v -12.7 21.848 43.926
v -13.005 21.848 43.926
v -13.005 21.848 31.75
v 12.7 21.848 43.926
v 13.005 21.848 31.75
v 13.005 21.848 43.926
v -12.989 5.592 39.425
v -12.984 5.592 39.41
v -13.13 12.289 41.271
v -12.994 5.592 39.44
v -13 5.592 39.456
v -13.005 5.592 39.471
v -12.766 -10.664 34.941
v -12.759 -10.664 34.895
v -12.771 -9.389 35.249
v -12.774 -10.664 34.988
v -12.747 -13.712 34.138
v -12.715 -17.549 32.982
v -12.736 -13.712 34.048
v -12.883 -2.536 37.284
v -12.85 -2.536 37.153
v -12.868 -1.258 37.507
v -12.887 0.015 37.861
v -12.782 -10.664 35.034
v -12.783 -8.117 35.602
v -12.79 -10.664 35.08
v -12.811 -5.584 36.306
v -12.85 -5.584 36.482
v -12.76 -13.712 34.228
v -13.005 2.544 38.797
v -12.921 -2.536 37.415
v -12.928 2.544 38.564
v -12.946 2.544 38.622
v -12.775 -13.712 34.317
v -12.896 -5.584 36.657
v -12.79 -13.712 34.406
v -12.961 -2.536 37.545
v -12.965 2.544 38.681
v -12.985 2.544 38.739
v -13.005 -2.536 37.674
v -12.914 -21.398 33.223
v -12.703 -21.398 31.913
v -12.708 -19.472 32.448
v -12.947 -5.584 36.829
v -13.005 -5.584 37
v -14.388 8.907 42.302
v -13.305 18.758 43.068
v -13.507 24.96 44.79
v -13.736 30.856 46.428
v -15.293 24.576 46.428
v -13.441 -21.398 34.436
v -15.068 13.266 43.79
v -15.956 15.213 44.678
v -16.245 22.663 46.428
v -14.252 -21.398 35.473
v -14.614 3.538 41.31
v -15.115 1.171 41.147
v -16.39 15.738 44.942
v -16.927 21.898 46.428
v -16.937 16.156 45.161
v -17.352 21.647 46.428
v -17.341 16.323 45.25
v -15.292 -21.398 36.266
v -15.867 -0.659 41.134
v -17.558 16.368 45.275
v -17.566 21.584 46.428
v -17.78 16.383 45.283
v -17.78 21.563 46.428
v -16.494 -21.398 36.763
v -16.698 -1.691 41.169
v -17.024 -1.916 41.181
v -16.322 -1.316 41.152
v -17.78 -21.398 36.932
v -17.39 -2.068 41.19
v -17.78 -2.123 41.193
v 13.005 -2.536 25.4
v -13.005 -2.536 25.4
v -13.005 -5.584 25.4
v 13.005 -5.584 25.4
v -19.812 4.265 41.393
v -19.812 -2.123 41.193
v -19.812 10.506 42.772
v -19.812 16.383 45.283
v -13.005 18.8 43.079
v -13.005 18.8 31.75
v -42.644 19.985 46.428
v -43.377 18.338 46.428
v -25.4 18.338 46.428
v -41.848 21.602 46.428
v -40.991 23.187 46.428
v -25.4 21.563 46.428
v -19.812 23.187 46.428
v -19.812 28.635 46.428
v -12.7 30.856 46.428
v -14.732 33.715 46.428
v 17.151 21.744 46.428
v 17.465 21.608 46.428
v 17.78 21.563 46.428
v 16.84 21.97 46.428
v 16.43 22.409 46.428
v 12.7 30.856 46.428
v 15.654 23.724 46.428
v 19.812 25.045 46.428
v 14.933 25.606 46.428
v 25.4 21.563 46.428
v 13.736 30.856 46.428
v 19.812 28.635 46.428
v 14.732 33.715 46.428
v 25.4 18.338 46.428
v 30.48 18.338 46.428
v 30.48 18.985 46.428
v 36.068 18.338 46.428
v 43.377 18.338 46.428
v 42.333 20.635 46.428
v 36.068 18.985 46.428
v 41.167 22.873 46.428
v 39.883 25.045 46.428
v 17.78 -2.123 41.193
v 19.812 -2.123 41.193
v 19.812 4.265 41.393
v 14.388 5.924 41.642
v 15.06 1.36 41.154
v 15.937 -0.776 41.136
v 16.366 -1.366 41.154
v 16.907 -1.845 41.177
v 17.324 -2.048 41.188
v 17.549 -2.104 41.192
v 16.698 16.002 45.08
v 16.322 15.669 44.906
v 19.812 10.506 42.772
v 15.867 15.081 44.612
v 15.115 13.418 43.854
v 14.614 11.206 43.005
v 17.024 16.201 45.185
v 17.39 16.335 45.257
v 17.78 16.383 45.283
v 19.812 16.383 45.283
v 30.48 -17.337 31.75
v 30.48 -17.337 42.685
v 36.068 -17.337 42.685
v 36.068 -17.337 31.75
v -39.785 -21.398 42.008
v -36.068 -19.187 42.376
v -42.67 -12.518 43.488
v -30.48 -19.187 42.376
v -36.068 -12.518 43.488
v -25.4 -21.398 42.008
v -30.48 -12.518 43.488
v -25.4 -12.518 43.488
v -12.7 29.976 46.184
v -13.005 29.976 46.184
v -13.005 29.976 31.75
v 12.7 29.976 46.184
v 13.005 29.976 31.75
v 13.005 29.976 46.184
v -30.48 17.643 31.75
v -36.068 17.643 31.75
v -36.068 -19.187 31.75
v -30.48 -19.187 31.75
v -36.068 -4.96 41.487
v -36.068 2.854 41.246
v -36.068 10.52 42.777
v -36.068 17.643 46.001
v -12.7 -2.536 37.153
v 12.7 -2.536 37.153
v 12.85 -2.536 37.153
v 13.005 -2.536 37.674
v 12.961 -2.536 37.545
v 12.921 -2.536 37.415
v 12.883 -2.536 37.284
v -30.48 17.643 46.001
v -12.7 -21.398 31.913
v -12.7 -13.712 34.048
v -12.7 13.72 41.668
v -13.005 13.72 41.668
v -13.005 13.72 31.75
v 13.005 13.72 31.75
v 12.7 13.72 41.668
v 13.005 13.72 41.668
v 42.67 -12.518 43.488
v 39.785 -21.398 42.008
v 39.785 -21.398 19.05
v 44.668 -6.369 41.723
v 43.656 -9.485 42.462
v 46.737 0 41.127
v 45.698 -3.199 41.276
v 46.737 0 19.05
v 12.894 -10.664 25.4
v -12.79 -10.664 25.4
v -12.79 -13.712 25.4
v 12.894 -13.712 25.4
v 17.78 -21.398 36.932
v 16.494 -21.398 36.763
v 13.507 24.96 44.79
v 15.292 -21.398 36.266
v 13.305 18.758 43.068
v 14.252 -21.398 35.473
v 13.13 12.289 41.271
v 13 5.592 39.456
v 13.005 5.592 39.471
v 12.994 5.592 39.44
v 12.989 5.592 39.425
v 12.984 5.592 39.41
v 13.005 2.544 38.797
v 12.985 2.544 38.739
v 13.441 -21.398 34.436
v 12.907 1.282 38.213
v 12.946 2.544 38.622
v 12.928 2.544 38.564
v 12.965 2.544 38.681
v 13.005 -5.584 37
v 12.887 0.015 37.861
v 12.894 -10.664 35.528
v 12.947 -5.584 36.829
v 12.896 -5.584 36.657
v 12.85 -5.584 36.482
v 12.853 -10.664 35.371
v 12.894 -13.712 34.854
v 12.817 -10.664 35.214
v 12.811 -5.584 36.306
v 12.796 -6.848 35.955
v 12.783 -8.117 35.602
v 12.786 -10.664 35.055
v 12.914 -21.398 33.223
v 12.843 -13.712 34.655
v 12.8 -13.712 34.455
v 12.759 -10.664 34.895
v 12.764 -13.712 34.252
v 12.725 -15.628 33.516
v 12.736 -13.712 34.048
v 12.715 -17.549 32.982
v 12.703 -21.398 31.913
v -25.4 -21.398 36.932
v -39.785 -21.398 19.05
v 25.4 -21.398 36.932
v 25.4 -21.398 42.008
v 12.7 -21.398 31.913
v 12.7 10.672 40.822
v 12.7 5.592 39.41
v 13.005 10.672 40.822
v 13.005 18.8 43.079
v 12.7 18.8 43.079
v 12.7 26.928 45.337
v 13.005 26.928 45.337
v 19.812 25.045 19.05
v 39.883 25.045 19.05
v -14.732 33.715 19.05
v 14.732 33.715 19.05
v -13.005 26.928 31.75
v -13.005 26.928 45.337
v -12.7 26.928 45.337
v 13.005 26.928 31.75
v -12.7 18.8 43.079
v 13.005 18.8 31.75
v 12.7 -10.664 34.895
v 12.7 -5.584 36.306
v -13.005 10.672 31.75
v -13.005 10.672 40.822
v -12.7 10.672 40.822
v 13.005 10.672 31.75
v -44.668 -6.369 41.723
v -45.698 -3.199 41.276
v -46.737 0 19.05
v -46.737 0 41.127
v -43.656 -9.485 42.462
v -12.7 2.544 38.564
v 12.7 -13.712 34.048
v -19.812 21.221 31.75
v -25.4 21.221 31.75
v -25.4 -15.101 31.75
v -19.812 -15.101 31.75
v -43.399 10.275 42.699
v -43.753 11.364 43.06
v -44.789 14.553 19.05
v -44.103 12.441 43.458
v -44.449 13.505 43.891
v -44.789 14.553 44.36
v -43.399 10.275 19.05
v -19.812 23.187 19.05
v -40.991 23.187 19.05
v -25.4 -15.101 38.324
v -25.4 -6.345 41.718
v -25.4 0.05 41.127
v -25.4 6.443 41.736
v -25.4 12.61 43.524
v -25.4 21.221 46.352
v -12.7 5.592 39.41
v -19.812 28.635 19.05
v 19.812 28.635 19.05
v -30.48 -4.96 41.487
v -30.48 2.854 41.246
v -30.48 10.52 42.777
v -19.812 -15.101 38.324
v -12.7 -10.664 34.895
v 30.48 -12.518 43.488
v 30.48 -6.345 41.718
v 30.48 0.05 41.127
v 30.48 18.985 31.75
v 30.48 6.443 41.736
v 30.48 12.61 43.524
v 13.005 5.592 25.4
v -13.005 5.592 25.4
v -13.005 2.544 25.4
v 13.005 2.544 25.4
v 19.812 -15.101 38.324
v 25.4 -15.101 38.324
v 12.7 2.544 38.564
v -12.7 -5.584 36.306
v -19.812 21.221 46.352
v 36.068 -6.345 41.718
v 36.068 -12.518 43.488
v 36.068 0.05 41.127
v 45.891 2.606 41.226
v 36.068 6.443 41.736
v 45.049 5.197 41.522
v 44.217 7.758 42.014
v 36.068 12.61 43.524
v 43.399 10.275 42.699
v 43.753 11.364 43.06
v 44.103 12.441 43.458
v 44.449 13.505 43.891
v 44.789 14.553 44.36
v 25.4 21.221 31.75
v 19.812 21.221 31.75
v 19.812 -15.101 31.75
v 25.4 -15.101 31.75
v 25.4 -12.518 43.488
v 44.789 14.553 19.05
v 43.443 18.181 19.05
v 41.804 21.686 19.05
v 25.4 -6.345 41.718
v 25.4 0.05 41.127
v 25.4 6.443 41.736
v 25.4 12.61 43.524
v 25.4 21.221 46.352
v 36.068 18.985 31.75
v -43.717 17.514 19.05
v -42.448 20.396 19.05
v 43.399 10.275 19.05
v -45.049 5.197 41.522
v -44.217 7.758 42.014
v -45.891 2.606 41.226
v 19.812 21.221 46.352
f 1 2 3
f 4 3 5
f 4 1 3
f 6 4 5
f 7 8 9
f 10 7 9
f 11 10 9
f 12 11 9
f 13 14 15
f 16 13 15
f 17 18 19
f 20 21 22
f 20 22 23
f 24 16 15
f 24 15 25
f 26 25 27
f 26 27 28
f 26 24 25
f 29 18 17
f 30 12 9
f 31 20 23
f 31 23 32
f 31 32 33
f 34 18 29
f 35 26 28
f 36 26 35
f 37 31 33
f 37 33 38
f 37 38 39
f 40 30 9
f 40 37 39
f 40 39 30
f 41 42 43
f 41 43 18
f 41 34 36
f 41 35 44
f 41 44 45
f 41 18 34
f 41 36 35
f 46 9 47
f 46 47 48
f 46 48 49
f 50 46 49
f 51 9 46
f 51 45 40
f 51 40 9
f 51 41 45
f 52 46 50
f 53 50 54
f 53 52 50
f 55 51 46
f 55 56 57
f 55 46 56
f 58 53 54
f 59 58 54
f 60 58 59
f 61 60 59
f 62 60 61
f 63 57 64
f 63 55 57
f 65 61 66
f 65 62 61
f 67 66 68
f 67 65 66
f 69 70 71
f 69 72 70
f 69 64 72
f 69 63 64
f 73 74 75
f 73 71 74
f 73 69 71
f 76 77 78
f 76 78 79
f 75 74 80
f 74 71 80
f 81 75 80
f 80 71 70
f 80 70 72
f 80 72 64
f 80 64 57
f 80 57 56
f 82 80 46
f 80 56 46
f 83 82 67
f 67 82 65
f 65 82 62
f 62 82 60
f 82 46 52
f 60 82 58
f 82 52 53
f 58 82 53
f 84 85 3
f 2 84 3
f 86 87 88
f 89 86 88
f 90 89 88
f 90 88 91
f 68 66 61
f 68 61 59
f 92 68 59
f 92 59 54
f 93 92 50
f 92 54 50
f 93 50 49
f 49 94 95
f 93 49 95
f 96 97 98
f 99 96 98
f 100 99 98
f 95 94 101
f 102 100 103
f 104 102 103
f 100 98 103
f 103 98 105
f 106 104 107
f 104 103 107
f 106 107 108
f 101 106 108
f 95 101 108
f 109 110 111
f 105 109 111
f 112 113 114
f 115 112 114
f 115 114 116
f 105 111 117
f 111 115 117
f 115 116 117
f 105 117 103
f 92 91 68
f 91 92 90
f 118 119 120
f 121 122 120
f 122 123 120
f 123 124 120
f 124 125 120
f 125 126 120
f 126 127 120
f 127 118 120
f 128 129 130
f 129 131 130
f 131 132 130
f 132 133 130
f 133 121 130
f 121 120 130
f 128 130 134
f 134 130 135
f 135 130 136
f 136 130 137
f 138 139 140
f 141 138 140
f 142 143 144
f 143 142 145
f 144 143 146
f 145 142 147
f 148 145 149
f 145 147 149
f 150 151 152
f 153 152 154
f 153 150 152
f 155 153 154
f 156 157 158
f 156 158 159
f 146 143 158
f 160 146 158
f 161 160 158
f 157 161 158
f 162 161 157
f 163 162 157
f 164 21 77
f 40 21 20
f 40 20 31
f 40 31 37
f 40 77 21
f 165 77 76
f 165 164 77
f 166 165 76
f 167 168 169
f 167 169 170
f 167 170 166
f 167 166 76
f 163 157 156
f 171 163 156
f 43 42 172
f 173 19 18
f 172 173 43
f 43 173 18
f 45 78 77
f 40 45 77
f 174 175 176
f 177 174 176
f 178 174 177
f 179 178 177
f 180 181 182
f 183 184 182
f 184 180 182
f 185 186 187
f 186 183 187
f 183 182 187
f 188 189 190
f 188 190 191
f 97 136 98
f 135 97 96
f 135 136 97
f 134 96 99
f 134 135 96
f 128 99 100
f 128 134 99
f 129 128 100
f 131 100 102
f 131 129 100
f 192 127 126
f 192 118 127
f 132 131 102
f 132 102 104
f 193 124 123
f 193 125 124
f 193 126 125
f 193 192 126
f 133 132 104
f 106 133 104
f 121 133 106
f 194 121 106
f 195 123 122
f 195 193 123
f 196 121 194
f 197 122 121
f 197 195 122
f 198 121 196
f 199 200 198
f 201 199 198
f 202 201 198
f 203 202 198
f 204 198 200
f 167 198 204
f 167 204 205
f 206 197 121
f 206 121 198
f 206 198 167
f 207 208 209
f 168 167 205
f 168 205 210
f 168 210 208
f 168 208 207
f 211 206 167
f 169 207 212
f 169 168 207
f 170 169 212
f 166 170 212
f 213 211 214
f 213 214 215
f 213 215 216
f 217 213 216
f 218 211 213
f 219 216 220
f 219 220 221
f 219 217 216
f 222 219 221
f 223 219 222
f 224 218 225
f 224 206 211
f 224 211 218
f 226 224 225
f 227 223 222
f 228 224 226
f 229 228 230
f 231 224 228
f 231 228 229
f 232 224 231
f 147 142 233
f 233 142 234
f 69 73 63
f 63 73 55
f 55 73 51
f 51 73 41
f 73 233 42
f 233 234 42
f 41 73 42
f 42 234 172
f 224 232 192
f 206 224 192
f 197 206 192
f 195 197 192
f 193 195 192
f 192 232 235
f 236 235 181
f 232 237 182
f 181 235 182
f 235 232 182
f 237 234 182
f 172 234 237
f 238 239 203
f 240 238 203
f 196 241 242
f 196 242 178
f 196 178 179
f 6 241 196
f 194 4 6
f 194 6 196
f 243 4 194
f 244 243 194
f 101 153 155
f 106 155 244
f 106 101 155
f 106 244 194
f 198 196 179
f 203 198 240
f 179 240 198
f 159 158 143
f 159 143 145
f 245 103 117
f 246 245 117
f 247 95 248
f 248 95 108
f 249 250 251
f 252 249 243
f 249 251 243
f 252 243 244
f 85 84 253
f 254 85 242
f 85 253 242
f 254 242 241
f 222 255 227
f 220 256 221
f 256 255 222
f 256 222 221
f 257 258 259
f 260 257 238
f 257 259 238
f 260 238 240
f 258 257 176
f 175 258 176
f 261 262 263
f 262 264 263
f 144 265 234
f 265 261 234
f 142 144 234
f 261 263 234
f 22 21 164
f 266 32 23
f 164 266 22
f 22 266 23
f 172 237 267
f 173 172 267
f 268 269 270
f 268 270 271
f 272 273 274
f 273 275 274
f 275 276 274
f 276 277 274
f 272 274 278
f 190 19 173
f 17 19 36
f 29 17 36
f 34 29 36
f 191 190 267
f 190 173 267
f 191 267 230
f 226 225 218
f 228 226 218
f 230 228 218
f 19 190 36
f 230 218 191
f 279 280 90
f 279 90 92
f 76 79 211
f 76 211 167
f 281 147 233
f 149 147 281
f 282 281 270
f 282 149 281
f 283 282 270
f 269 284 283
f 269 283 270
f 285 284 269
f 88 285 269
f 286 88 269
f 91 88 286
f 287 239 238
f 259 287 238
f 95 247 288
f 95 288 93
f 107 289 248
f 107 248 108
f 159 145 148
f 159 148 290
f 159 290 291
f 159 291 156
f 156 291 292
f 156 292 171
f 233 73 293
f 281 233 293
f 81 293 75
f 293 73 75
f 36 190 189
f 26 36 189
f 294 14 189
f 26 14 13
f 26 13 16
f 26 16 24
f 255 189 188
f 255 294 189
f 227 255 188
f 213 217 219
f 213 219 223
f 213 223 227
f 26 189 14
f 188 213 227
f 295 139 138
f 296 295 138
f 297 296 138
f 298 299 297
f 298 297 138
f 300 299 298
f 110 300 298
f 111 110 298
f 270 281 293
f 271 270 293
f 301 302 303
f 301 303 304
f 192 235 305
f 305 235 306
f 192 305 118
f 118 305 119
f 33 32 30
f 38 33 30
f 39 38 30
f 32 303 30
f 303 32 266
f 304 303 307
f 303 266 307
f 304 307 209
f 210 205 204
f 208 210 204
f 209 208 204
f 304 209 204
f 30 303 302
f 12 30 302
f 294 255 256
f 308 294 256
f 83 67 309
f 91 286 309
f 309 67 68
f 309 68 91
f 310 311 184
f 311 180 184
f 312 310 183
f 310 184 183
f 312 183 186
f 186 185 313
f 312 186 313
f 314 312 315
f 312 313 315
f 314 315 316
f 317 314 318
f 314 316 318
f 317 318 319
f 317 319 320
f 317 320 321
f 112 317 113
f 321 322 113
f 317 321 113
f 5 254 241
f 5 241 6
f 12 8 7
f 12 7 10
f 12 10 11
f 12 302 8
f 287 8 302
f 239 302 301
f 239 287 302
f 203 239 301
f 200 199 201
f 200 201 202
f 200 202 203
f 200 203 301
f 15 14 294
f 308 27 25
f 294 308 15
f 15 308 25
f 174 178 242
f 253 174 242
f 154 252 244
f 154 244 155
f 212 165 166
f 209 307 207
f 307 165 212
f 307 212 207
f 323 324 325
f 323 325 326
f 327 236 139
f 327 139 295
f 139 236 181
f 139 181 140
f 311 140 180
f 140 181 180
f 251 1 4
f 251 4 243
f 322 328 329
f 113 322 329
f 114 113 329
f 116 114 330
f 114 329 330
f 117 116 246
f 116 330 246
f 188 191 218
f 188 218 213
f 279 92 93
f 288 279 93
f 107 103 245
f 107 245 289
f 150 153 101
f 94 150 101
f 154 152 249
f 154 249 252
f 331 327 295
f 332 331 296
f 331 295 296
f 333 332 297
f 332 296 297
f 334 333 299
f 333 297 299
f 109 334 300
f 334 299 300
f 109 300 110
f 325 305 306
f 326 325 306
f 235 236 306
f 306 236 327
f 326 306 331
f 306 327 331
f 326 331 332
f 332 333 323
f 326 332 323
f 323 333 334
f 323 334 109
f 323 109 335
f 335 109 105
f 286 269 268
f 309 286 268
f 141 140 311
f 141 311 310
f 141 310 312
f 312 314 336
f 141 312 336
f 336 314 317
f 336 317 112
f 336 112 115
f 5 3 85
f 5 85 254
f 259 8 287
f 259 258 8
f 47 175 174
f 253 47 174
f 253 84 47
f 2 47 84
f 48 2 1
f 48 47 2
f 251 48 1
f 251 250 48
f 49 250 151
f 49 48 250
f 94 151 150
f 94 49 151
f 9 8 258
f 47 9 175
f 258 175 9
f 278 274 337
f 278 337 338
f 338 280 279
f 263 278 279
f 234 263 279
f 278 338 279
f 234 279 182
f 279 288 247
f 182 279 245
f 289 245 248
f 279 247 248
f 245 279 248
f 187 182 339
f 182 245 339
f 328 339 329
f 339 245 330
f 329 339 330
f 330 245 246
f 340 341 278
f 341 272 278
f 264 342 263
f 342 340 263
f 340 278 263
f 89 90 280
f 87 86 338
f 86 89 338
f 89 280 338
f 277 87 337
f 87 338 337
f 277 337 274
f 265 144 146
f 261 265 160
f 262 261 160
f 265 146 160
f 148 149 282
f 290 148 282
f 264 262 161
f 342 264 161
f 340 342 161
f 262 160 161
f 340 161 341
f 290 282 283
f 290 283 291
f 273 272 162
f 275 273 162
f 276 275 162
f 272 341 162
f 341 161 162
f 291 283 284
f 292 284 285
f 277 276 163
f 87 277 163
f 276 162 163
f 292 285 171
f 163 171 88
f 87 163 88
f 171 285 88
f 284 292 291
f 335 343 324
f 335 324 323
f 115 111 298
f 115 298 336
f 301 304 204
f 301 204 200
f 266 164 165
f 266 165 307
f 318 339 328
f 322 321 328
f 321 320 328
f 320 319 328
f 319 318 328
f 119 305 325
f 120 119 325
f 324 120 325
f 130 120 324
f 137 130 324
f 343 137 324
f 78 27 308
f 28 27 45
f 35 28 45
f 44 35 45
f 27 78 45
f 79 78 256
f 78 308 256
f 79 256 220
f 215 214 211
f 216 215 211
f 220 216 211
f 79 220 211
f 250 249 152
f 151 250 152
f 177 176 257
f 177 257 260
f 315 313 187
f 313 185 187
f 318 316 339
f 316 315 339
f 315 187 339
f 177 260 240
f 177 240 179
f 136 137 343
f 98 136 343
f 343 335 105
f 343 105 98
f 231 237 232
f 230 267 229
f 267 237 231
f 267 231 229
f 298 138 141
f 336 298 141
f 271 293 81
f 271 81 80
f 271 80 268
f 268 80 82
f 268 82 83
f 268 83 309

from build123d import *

# Parameters (mm, degrees)
F1_START       = 19.05
F1_DEPTH       = 31.75
F3_DEPTH       = 12.7
F5_DEPTH       = 25.4
F7_DEPTH       = 50.8
F10_T4_DEPTH   = 118.8107467306
F10_T9_DEPTH   = 118.8107467306
F11_W          = 5.588
F11_H          = 36.83
F11_H_2        = 36.322
F12_DEPTH      = 25.4
F12_DEPTH_BACK = 19.05
F13_W          = 26.0096
F13_H          = 3.048
F14_DEPTH      = 19.05
F15_W          = 26.0096
F15_H          = 3.048
F15_W_2        = 25.684906454
F16_DEPTH      = 25.4
F17_R          = 34.3708732133
F18_DEPTH      = 63.5
F19_W          = 101.6
F19_H          = 32.0445634425
F19_W_2        = 28.5529913381
F19_H_2        = 6.6054575145
F19_H_3        = 10.527446866
F19_W_3        = 20.7230086619
F19_H_4        = 8.6696632206
F19_H_5        = 7.8439861536
F20_DEPTH      = 38.1
F21_SIZE       = 5.08


# Not quite as in the source:
# - a fillet or chamfer that OpenCascade refuses, or shapes differently, is made with other operations: its cross-section is extruded or revolved along the edge and cut away or added
# - a feature of the source that left no trace in its solid (it failed there, or was rolled back) is left out


with BuildPart() as f1:
    # F0 (on Top) → F1 (new body)
    with BuildSketch(Plane.XY.offset(F1_START)):
        Polygon((-27.681270317, -38.1), (-23.1827056925, -38.1), (-29.0714032363, -33.8216107999), align=None)
        Polygon((-29.0714032363, -33.8216107999), (-23.1827056925, -38.1), (23.1827056925, -38.1), (29.0714032363, -33.8216107999), (43.3991033054, 10.2745158286), (41.1498209932, 17.1970949714), (3.6394152315, 44.45), (-3.6394152315, 44.45), (-41.1498209932, 17.1970949714), (-43.3991033054, 10.2745158286), align=None)
        with BuildLine():
            Line((23.1827056925, -38.1), (-23.1827056925, -38.1))
            Line((-23.1827056925, -38.1), (-27.681270317, -38.1))
            ThreePointArc((-27.681270317, -38.1), (0, -47.0941899427), (27.681270317, -38.1))
            Line((27.681270317, -38.1), (23.1827056925, -38.1))
        make_face()
        Polygon((-37.8114284312, -27.4716107999), (-29.0714032363, -33.8216107999), (-43.3991033054, 10.2745158286), (-46.7374958674, 0), align=None)
        Polygon((29.0714032363, -33.8216107999), (23.1827056925, -38.1), (27.681270317, -38.1), align=None)
        Polygon((-44.7892362247, 14.5529050286), (-43.3991033054, 10.2745158286), (-41.1498209932, 17.1970949714), align=None)
        Polygon((43.3991033054, 10.2745158286), (29.0714032363, -33.8216107999), (37.8114284312, -27.4716107999), (46.7374958674, 0), align=None)
        with BuildLine():
            Line((-44.7892362247, 14.5529050286), (-41.1498209932, 17.1970949714))
            Line((-41.1498209932, 17.1970949714), (-3.6394152315, 44.45))
            Line((-3.6394152315, 44.45), (0, 47.0941899427))
            ThreePointArc((0, 47.0941899427), (-27.681270317, 38.1), (-44.7892362247, 14.5529050286))
        make_face()
        Polygon((41.1498209932, 17.1970949714), (43.3991033054, 10.2745158286), (44.7892362247, 14.5529050286), align=None)
        Polygon((0, 47.0941899427), (-3.6394152315, 44.45), (3.6394152315, 44.45), align=None)
        with BuildLine():
            ThreePointArc((44.7892362247, 14.5529050286), (27.681270317, 38.1), (0, 47.0941899427))
            Line((0, 47.0941899427), (3.6394152315, 44.45))
            Line((3.6394152315, 44.45), (41.1498209932, 17.1970949714))
            Line((41.1498209932, 17.1970949714), (44.7892362247, 14.5529050286))
        make_face()
    extrude(amount=F1_DEPTH)

    # F2 (on Right) → F3 (cut, symmetric)
    with BuildSketch(Plane.YZ):
        Polygon((-44.8449260175, 25.4), (69.4550739825, 57.15), (-44.8449260175, 57.15), align=None)
    extrude(amount=F3_DEPTH, both=True, mode=Mode.SUBTRACT)

    # F4 (on Right) → F5 (cut, symmetric)
    with BuildSketch(Plane.YZ):
        Polygon((-44.8449260175, 31.75), (70.0721293688, 57.15), (-44.8449260175, 57.15), align=None)
    extrude(amount=F5_DEPTH, both=True, mode=Mode.SUBTRACT)

    # F6 (on Right) → F7 (cut, symmetric)
    with BuildSketch(Plane.YZ):
        Polygon((69.4550739825, 57.15), (-44.8449260175, 57.15), (-44.8449260175, 38.1), (5.1235620631, 46.4280813468), (48.464309937, 53.6515393258), align=None)
        Polygon((48.464309937, 46.4280813468), (48.464309937, 53.6515393258), (5.1235620631, 46.4280813468), align=None)
    extrude(amount=F7_DEPTH, both=True, mode=Mode.SUBTRACT)

    # F10: fillet of radius 5.08 on 2 edges, made by hand


with BuildPart() as f10_tool2:
    # F10_s3 → F10_t4 (new body)
    with BuildSketch(Plane(origin=(0, -48.4660281995, -10.712396973), x_dir=(1, 0, 0), z_dir=(0, 0.9764331595, 0.2158200292))):
        with BuildLine():
            ThreePointArc((-12.7, -35.6001860579), (-14.1878975516, -39.1922885063), (-17.78, -40.6801860579))
            Line((-17.78, -40.6801860579), (-12.7, -40.6801860579))
            Line((-12.7, -40.6801860579), (-12.7, -35.6001860579))
        make_face()
    extrude(amount=F10_T4_DEPTH)

    split(bisect_by=Plane(origin=(0, -9.762530517, 35.1451098613), x_dir=(1, 0, 0), z_dir=(0, -0.2676438638, 0.9635179096)), keep=Keep.TOP)


with BuildPart() as f1_1:
    add(f1.part)

    # F10_t1: cut F10_tool2
    add(f10_tool2.part, mode=Mode.SUBTRACT)


with BuildPart() as f10_tool7:
    # F10_s8 → F10_t9 (new body)
    with BuildSketch(Plane(origin=(0, -48.4660281995, -10.712396973), x_dir=(1, 0, 0), z_dir=(0, 0.9764331595, 0.2158200292))):
        with BuildLine():
            ThreePointArc((17.78, -40.6801860579), (14.1878975516, -39.1922885063), (12.7, -35.6001860579))
            Line((12.7, -35.6001860579), (12.7, -40.6801860579))
            Line((12.7, -40.6801860579), (17.78, -40.6801860579))
        make_face()
    extrude(amount=F10_T9_DEPTH)

    split(bisect_by=Plane(origin=(0, -9.762530517, 35.1451098613), x_dir=(1, 0, 0), z_dir=(0, -0.2676438638, 0.9635179096)), keep=Keep.TOP)


with BuildPart() as f1_2:
    add(f1_1.part)

    # F10_t6: cut F10_tool7
    add(f10_tool7.part, mode=Mode.SUBTRACT)

    # F11 (on offset) → F12 (cut, two sides)
    with BuildSketch(Plane.XY.offset(50.8)) as f12_sk:
        with Locations((-33.274, -0.7722239547)):
            Rectangle(F11_W, F11_H)
        with Locations((-22.606, 3.0599313468)):
            Rectangle(F11_W, F11_H_2)
        with Locations((33.274, 0.82358277)):
            Rectangle(F11_W, F11_H_2)
        with Locations((22.606, 3.0599313468)):
            Rectangle(F11_W, F11_H_2)
    extrude(amount=F12_DEPTH, mode=Mode.SUBTRACT)
    extrude(f12_sk.sketch, amount=-F12_DEPTH_BACK, mode=Mode.SUBTRACT)

    # F13 (on offset) → F14 (cut)
    with BuildSketch(Plane.XY.offset(50.8)):
        with Locations((0, 12.1964783492)):
            Rectangle(F13_W, F13_H)
        with Locations((0, 28.4524783492)):
            Rectangle(F13_W, F13_H)
        with Locations((0, 20.3244783492)):
            Rectangle(F13_W, F13_H)
    extrude(amount=-F14_DEPTH, mode=Mode.SUBTRACT)

    # F15 (on offset) → F16 (cut)
    with BuildSketch(Plane.XY.offset(50.8)):
        with Locations((0, -4.0595216508)):
            Rectangle(F15_W, F15_H)
        with Locations((0.0519962238, -12.1875216508)):
            Rectangle(F15_W_2, F15_H)
        with Locations((0, 4.0684783492)):
            Rectangle(F15_W, F15_H)
    extrude(amount=-F16_DEPTH, mode=Mode.SUBTRACT)

    # F17 (on Right) → F18 (cut, symmetric)
    with BuildSketch(Plane.YZ):
        with Locations((0, 75.4981189966)):
            Circle(F17_R)
    extrude(amount=F18_DEPTH, both=True, mode=Mode.SUBTRACT)

    # F19 (on offset) → F20 (cut, symmetric)
    with BuildSketch(Plane.XY.offset(50.8)):
        with Locations((-3.9149913381, -37.4202784151)):
            Rectangle(F19_W, F19_H)
        Polygon((46.8850086619, 51.8795326352), (-54.7149913381, 51.8795326352), (-54.7149913381, 33.7145216763), (-48.3649913381, 33.7145216763), (-48.3649913381, 40.3199791908), (-19.812, 40.3199791908), (-19.812, 33.7145216763), (19.812, 33.7145216763), (19.812, 41.5585078299), (40.5350086619, 41.5585078299), (40.5350086619, 33.7145216763), (46.8850086619, 33.7145216763), align=None)
        with Locations((-34.088495669, 37.0172504336)):
            Rectangle(F19_W_2, F19_H_2)
        with Locations((-34.088495669, 28.4507982433)):
            Rectangle(F19_W_2, F19_H_3)
        with Locations((30.173504331, 29.379690066)):
            Rectangle(F19_W_3, F19_H_4)
        with Locations((30.173504331, 37.6365147531)):
            Rectangle(F19_W_3, F19_H_5)
    extrude(amount=F20_DEPTH, both=True, mode=Mode.SUBTRACT)

    # F21
    f21_edges = [f1_2.edges().sort_by_distance(p)[0] for p in [
        (-19.812, 33.714522, 32.739041),
        (19.812, 33.714522, 32.739041),
    ]]
    chamfer(f21_edges, length=F21_SIZE)


solid = f1_2.part
